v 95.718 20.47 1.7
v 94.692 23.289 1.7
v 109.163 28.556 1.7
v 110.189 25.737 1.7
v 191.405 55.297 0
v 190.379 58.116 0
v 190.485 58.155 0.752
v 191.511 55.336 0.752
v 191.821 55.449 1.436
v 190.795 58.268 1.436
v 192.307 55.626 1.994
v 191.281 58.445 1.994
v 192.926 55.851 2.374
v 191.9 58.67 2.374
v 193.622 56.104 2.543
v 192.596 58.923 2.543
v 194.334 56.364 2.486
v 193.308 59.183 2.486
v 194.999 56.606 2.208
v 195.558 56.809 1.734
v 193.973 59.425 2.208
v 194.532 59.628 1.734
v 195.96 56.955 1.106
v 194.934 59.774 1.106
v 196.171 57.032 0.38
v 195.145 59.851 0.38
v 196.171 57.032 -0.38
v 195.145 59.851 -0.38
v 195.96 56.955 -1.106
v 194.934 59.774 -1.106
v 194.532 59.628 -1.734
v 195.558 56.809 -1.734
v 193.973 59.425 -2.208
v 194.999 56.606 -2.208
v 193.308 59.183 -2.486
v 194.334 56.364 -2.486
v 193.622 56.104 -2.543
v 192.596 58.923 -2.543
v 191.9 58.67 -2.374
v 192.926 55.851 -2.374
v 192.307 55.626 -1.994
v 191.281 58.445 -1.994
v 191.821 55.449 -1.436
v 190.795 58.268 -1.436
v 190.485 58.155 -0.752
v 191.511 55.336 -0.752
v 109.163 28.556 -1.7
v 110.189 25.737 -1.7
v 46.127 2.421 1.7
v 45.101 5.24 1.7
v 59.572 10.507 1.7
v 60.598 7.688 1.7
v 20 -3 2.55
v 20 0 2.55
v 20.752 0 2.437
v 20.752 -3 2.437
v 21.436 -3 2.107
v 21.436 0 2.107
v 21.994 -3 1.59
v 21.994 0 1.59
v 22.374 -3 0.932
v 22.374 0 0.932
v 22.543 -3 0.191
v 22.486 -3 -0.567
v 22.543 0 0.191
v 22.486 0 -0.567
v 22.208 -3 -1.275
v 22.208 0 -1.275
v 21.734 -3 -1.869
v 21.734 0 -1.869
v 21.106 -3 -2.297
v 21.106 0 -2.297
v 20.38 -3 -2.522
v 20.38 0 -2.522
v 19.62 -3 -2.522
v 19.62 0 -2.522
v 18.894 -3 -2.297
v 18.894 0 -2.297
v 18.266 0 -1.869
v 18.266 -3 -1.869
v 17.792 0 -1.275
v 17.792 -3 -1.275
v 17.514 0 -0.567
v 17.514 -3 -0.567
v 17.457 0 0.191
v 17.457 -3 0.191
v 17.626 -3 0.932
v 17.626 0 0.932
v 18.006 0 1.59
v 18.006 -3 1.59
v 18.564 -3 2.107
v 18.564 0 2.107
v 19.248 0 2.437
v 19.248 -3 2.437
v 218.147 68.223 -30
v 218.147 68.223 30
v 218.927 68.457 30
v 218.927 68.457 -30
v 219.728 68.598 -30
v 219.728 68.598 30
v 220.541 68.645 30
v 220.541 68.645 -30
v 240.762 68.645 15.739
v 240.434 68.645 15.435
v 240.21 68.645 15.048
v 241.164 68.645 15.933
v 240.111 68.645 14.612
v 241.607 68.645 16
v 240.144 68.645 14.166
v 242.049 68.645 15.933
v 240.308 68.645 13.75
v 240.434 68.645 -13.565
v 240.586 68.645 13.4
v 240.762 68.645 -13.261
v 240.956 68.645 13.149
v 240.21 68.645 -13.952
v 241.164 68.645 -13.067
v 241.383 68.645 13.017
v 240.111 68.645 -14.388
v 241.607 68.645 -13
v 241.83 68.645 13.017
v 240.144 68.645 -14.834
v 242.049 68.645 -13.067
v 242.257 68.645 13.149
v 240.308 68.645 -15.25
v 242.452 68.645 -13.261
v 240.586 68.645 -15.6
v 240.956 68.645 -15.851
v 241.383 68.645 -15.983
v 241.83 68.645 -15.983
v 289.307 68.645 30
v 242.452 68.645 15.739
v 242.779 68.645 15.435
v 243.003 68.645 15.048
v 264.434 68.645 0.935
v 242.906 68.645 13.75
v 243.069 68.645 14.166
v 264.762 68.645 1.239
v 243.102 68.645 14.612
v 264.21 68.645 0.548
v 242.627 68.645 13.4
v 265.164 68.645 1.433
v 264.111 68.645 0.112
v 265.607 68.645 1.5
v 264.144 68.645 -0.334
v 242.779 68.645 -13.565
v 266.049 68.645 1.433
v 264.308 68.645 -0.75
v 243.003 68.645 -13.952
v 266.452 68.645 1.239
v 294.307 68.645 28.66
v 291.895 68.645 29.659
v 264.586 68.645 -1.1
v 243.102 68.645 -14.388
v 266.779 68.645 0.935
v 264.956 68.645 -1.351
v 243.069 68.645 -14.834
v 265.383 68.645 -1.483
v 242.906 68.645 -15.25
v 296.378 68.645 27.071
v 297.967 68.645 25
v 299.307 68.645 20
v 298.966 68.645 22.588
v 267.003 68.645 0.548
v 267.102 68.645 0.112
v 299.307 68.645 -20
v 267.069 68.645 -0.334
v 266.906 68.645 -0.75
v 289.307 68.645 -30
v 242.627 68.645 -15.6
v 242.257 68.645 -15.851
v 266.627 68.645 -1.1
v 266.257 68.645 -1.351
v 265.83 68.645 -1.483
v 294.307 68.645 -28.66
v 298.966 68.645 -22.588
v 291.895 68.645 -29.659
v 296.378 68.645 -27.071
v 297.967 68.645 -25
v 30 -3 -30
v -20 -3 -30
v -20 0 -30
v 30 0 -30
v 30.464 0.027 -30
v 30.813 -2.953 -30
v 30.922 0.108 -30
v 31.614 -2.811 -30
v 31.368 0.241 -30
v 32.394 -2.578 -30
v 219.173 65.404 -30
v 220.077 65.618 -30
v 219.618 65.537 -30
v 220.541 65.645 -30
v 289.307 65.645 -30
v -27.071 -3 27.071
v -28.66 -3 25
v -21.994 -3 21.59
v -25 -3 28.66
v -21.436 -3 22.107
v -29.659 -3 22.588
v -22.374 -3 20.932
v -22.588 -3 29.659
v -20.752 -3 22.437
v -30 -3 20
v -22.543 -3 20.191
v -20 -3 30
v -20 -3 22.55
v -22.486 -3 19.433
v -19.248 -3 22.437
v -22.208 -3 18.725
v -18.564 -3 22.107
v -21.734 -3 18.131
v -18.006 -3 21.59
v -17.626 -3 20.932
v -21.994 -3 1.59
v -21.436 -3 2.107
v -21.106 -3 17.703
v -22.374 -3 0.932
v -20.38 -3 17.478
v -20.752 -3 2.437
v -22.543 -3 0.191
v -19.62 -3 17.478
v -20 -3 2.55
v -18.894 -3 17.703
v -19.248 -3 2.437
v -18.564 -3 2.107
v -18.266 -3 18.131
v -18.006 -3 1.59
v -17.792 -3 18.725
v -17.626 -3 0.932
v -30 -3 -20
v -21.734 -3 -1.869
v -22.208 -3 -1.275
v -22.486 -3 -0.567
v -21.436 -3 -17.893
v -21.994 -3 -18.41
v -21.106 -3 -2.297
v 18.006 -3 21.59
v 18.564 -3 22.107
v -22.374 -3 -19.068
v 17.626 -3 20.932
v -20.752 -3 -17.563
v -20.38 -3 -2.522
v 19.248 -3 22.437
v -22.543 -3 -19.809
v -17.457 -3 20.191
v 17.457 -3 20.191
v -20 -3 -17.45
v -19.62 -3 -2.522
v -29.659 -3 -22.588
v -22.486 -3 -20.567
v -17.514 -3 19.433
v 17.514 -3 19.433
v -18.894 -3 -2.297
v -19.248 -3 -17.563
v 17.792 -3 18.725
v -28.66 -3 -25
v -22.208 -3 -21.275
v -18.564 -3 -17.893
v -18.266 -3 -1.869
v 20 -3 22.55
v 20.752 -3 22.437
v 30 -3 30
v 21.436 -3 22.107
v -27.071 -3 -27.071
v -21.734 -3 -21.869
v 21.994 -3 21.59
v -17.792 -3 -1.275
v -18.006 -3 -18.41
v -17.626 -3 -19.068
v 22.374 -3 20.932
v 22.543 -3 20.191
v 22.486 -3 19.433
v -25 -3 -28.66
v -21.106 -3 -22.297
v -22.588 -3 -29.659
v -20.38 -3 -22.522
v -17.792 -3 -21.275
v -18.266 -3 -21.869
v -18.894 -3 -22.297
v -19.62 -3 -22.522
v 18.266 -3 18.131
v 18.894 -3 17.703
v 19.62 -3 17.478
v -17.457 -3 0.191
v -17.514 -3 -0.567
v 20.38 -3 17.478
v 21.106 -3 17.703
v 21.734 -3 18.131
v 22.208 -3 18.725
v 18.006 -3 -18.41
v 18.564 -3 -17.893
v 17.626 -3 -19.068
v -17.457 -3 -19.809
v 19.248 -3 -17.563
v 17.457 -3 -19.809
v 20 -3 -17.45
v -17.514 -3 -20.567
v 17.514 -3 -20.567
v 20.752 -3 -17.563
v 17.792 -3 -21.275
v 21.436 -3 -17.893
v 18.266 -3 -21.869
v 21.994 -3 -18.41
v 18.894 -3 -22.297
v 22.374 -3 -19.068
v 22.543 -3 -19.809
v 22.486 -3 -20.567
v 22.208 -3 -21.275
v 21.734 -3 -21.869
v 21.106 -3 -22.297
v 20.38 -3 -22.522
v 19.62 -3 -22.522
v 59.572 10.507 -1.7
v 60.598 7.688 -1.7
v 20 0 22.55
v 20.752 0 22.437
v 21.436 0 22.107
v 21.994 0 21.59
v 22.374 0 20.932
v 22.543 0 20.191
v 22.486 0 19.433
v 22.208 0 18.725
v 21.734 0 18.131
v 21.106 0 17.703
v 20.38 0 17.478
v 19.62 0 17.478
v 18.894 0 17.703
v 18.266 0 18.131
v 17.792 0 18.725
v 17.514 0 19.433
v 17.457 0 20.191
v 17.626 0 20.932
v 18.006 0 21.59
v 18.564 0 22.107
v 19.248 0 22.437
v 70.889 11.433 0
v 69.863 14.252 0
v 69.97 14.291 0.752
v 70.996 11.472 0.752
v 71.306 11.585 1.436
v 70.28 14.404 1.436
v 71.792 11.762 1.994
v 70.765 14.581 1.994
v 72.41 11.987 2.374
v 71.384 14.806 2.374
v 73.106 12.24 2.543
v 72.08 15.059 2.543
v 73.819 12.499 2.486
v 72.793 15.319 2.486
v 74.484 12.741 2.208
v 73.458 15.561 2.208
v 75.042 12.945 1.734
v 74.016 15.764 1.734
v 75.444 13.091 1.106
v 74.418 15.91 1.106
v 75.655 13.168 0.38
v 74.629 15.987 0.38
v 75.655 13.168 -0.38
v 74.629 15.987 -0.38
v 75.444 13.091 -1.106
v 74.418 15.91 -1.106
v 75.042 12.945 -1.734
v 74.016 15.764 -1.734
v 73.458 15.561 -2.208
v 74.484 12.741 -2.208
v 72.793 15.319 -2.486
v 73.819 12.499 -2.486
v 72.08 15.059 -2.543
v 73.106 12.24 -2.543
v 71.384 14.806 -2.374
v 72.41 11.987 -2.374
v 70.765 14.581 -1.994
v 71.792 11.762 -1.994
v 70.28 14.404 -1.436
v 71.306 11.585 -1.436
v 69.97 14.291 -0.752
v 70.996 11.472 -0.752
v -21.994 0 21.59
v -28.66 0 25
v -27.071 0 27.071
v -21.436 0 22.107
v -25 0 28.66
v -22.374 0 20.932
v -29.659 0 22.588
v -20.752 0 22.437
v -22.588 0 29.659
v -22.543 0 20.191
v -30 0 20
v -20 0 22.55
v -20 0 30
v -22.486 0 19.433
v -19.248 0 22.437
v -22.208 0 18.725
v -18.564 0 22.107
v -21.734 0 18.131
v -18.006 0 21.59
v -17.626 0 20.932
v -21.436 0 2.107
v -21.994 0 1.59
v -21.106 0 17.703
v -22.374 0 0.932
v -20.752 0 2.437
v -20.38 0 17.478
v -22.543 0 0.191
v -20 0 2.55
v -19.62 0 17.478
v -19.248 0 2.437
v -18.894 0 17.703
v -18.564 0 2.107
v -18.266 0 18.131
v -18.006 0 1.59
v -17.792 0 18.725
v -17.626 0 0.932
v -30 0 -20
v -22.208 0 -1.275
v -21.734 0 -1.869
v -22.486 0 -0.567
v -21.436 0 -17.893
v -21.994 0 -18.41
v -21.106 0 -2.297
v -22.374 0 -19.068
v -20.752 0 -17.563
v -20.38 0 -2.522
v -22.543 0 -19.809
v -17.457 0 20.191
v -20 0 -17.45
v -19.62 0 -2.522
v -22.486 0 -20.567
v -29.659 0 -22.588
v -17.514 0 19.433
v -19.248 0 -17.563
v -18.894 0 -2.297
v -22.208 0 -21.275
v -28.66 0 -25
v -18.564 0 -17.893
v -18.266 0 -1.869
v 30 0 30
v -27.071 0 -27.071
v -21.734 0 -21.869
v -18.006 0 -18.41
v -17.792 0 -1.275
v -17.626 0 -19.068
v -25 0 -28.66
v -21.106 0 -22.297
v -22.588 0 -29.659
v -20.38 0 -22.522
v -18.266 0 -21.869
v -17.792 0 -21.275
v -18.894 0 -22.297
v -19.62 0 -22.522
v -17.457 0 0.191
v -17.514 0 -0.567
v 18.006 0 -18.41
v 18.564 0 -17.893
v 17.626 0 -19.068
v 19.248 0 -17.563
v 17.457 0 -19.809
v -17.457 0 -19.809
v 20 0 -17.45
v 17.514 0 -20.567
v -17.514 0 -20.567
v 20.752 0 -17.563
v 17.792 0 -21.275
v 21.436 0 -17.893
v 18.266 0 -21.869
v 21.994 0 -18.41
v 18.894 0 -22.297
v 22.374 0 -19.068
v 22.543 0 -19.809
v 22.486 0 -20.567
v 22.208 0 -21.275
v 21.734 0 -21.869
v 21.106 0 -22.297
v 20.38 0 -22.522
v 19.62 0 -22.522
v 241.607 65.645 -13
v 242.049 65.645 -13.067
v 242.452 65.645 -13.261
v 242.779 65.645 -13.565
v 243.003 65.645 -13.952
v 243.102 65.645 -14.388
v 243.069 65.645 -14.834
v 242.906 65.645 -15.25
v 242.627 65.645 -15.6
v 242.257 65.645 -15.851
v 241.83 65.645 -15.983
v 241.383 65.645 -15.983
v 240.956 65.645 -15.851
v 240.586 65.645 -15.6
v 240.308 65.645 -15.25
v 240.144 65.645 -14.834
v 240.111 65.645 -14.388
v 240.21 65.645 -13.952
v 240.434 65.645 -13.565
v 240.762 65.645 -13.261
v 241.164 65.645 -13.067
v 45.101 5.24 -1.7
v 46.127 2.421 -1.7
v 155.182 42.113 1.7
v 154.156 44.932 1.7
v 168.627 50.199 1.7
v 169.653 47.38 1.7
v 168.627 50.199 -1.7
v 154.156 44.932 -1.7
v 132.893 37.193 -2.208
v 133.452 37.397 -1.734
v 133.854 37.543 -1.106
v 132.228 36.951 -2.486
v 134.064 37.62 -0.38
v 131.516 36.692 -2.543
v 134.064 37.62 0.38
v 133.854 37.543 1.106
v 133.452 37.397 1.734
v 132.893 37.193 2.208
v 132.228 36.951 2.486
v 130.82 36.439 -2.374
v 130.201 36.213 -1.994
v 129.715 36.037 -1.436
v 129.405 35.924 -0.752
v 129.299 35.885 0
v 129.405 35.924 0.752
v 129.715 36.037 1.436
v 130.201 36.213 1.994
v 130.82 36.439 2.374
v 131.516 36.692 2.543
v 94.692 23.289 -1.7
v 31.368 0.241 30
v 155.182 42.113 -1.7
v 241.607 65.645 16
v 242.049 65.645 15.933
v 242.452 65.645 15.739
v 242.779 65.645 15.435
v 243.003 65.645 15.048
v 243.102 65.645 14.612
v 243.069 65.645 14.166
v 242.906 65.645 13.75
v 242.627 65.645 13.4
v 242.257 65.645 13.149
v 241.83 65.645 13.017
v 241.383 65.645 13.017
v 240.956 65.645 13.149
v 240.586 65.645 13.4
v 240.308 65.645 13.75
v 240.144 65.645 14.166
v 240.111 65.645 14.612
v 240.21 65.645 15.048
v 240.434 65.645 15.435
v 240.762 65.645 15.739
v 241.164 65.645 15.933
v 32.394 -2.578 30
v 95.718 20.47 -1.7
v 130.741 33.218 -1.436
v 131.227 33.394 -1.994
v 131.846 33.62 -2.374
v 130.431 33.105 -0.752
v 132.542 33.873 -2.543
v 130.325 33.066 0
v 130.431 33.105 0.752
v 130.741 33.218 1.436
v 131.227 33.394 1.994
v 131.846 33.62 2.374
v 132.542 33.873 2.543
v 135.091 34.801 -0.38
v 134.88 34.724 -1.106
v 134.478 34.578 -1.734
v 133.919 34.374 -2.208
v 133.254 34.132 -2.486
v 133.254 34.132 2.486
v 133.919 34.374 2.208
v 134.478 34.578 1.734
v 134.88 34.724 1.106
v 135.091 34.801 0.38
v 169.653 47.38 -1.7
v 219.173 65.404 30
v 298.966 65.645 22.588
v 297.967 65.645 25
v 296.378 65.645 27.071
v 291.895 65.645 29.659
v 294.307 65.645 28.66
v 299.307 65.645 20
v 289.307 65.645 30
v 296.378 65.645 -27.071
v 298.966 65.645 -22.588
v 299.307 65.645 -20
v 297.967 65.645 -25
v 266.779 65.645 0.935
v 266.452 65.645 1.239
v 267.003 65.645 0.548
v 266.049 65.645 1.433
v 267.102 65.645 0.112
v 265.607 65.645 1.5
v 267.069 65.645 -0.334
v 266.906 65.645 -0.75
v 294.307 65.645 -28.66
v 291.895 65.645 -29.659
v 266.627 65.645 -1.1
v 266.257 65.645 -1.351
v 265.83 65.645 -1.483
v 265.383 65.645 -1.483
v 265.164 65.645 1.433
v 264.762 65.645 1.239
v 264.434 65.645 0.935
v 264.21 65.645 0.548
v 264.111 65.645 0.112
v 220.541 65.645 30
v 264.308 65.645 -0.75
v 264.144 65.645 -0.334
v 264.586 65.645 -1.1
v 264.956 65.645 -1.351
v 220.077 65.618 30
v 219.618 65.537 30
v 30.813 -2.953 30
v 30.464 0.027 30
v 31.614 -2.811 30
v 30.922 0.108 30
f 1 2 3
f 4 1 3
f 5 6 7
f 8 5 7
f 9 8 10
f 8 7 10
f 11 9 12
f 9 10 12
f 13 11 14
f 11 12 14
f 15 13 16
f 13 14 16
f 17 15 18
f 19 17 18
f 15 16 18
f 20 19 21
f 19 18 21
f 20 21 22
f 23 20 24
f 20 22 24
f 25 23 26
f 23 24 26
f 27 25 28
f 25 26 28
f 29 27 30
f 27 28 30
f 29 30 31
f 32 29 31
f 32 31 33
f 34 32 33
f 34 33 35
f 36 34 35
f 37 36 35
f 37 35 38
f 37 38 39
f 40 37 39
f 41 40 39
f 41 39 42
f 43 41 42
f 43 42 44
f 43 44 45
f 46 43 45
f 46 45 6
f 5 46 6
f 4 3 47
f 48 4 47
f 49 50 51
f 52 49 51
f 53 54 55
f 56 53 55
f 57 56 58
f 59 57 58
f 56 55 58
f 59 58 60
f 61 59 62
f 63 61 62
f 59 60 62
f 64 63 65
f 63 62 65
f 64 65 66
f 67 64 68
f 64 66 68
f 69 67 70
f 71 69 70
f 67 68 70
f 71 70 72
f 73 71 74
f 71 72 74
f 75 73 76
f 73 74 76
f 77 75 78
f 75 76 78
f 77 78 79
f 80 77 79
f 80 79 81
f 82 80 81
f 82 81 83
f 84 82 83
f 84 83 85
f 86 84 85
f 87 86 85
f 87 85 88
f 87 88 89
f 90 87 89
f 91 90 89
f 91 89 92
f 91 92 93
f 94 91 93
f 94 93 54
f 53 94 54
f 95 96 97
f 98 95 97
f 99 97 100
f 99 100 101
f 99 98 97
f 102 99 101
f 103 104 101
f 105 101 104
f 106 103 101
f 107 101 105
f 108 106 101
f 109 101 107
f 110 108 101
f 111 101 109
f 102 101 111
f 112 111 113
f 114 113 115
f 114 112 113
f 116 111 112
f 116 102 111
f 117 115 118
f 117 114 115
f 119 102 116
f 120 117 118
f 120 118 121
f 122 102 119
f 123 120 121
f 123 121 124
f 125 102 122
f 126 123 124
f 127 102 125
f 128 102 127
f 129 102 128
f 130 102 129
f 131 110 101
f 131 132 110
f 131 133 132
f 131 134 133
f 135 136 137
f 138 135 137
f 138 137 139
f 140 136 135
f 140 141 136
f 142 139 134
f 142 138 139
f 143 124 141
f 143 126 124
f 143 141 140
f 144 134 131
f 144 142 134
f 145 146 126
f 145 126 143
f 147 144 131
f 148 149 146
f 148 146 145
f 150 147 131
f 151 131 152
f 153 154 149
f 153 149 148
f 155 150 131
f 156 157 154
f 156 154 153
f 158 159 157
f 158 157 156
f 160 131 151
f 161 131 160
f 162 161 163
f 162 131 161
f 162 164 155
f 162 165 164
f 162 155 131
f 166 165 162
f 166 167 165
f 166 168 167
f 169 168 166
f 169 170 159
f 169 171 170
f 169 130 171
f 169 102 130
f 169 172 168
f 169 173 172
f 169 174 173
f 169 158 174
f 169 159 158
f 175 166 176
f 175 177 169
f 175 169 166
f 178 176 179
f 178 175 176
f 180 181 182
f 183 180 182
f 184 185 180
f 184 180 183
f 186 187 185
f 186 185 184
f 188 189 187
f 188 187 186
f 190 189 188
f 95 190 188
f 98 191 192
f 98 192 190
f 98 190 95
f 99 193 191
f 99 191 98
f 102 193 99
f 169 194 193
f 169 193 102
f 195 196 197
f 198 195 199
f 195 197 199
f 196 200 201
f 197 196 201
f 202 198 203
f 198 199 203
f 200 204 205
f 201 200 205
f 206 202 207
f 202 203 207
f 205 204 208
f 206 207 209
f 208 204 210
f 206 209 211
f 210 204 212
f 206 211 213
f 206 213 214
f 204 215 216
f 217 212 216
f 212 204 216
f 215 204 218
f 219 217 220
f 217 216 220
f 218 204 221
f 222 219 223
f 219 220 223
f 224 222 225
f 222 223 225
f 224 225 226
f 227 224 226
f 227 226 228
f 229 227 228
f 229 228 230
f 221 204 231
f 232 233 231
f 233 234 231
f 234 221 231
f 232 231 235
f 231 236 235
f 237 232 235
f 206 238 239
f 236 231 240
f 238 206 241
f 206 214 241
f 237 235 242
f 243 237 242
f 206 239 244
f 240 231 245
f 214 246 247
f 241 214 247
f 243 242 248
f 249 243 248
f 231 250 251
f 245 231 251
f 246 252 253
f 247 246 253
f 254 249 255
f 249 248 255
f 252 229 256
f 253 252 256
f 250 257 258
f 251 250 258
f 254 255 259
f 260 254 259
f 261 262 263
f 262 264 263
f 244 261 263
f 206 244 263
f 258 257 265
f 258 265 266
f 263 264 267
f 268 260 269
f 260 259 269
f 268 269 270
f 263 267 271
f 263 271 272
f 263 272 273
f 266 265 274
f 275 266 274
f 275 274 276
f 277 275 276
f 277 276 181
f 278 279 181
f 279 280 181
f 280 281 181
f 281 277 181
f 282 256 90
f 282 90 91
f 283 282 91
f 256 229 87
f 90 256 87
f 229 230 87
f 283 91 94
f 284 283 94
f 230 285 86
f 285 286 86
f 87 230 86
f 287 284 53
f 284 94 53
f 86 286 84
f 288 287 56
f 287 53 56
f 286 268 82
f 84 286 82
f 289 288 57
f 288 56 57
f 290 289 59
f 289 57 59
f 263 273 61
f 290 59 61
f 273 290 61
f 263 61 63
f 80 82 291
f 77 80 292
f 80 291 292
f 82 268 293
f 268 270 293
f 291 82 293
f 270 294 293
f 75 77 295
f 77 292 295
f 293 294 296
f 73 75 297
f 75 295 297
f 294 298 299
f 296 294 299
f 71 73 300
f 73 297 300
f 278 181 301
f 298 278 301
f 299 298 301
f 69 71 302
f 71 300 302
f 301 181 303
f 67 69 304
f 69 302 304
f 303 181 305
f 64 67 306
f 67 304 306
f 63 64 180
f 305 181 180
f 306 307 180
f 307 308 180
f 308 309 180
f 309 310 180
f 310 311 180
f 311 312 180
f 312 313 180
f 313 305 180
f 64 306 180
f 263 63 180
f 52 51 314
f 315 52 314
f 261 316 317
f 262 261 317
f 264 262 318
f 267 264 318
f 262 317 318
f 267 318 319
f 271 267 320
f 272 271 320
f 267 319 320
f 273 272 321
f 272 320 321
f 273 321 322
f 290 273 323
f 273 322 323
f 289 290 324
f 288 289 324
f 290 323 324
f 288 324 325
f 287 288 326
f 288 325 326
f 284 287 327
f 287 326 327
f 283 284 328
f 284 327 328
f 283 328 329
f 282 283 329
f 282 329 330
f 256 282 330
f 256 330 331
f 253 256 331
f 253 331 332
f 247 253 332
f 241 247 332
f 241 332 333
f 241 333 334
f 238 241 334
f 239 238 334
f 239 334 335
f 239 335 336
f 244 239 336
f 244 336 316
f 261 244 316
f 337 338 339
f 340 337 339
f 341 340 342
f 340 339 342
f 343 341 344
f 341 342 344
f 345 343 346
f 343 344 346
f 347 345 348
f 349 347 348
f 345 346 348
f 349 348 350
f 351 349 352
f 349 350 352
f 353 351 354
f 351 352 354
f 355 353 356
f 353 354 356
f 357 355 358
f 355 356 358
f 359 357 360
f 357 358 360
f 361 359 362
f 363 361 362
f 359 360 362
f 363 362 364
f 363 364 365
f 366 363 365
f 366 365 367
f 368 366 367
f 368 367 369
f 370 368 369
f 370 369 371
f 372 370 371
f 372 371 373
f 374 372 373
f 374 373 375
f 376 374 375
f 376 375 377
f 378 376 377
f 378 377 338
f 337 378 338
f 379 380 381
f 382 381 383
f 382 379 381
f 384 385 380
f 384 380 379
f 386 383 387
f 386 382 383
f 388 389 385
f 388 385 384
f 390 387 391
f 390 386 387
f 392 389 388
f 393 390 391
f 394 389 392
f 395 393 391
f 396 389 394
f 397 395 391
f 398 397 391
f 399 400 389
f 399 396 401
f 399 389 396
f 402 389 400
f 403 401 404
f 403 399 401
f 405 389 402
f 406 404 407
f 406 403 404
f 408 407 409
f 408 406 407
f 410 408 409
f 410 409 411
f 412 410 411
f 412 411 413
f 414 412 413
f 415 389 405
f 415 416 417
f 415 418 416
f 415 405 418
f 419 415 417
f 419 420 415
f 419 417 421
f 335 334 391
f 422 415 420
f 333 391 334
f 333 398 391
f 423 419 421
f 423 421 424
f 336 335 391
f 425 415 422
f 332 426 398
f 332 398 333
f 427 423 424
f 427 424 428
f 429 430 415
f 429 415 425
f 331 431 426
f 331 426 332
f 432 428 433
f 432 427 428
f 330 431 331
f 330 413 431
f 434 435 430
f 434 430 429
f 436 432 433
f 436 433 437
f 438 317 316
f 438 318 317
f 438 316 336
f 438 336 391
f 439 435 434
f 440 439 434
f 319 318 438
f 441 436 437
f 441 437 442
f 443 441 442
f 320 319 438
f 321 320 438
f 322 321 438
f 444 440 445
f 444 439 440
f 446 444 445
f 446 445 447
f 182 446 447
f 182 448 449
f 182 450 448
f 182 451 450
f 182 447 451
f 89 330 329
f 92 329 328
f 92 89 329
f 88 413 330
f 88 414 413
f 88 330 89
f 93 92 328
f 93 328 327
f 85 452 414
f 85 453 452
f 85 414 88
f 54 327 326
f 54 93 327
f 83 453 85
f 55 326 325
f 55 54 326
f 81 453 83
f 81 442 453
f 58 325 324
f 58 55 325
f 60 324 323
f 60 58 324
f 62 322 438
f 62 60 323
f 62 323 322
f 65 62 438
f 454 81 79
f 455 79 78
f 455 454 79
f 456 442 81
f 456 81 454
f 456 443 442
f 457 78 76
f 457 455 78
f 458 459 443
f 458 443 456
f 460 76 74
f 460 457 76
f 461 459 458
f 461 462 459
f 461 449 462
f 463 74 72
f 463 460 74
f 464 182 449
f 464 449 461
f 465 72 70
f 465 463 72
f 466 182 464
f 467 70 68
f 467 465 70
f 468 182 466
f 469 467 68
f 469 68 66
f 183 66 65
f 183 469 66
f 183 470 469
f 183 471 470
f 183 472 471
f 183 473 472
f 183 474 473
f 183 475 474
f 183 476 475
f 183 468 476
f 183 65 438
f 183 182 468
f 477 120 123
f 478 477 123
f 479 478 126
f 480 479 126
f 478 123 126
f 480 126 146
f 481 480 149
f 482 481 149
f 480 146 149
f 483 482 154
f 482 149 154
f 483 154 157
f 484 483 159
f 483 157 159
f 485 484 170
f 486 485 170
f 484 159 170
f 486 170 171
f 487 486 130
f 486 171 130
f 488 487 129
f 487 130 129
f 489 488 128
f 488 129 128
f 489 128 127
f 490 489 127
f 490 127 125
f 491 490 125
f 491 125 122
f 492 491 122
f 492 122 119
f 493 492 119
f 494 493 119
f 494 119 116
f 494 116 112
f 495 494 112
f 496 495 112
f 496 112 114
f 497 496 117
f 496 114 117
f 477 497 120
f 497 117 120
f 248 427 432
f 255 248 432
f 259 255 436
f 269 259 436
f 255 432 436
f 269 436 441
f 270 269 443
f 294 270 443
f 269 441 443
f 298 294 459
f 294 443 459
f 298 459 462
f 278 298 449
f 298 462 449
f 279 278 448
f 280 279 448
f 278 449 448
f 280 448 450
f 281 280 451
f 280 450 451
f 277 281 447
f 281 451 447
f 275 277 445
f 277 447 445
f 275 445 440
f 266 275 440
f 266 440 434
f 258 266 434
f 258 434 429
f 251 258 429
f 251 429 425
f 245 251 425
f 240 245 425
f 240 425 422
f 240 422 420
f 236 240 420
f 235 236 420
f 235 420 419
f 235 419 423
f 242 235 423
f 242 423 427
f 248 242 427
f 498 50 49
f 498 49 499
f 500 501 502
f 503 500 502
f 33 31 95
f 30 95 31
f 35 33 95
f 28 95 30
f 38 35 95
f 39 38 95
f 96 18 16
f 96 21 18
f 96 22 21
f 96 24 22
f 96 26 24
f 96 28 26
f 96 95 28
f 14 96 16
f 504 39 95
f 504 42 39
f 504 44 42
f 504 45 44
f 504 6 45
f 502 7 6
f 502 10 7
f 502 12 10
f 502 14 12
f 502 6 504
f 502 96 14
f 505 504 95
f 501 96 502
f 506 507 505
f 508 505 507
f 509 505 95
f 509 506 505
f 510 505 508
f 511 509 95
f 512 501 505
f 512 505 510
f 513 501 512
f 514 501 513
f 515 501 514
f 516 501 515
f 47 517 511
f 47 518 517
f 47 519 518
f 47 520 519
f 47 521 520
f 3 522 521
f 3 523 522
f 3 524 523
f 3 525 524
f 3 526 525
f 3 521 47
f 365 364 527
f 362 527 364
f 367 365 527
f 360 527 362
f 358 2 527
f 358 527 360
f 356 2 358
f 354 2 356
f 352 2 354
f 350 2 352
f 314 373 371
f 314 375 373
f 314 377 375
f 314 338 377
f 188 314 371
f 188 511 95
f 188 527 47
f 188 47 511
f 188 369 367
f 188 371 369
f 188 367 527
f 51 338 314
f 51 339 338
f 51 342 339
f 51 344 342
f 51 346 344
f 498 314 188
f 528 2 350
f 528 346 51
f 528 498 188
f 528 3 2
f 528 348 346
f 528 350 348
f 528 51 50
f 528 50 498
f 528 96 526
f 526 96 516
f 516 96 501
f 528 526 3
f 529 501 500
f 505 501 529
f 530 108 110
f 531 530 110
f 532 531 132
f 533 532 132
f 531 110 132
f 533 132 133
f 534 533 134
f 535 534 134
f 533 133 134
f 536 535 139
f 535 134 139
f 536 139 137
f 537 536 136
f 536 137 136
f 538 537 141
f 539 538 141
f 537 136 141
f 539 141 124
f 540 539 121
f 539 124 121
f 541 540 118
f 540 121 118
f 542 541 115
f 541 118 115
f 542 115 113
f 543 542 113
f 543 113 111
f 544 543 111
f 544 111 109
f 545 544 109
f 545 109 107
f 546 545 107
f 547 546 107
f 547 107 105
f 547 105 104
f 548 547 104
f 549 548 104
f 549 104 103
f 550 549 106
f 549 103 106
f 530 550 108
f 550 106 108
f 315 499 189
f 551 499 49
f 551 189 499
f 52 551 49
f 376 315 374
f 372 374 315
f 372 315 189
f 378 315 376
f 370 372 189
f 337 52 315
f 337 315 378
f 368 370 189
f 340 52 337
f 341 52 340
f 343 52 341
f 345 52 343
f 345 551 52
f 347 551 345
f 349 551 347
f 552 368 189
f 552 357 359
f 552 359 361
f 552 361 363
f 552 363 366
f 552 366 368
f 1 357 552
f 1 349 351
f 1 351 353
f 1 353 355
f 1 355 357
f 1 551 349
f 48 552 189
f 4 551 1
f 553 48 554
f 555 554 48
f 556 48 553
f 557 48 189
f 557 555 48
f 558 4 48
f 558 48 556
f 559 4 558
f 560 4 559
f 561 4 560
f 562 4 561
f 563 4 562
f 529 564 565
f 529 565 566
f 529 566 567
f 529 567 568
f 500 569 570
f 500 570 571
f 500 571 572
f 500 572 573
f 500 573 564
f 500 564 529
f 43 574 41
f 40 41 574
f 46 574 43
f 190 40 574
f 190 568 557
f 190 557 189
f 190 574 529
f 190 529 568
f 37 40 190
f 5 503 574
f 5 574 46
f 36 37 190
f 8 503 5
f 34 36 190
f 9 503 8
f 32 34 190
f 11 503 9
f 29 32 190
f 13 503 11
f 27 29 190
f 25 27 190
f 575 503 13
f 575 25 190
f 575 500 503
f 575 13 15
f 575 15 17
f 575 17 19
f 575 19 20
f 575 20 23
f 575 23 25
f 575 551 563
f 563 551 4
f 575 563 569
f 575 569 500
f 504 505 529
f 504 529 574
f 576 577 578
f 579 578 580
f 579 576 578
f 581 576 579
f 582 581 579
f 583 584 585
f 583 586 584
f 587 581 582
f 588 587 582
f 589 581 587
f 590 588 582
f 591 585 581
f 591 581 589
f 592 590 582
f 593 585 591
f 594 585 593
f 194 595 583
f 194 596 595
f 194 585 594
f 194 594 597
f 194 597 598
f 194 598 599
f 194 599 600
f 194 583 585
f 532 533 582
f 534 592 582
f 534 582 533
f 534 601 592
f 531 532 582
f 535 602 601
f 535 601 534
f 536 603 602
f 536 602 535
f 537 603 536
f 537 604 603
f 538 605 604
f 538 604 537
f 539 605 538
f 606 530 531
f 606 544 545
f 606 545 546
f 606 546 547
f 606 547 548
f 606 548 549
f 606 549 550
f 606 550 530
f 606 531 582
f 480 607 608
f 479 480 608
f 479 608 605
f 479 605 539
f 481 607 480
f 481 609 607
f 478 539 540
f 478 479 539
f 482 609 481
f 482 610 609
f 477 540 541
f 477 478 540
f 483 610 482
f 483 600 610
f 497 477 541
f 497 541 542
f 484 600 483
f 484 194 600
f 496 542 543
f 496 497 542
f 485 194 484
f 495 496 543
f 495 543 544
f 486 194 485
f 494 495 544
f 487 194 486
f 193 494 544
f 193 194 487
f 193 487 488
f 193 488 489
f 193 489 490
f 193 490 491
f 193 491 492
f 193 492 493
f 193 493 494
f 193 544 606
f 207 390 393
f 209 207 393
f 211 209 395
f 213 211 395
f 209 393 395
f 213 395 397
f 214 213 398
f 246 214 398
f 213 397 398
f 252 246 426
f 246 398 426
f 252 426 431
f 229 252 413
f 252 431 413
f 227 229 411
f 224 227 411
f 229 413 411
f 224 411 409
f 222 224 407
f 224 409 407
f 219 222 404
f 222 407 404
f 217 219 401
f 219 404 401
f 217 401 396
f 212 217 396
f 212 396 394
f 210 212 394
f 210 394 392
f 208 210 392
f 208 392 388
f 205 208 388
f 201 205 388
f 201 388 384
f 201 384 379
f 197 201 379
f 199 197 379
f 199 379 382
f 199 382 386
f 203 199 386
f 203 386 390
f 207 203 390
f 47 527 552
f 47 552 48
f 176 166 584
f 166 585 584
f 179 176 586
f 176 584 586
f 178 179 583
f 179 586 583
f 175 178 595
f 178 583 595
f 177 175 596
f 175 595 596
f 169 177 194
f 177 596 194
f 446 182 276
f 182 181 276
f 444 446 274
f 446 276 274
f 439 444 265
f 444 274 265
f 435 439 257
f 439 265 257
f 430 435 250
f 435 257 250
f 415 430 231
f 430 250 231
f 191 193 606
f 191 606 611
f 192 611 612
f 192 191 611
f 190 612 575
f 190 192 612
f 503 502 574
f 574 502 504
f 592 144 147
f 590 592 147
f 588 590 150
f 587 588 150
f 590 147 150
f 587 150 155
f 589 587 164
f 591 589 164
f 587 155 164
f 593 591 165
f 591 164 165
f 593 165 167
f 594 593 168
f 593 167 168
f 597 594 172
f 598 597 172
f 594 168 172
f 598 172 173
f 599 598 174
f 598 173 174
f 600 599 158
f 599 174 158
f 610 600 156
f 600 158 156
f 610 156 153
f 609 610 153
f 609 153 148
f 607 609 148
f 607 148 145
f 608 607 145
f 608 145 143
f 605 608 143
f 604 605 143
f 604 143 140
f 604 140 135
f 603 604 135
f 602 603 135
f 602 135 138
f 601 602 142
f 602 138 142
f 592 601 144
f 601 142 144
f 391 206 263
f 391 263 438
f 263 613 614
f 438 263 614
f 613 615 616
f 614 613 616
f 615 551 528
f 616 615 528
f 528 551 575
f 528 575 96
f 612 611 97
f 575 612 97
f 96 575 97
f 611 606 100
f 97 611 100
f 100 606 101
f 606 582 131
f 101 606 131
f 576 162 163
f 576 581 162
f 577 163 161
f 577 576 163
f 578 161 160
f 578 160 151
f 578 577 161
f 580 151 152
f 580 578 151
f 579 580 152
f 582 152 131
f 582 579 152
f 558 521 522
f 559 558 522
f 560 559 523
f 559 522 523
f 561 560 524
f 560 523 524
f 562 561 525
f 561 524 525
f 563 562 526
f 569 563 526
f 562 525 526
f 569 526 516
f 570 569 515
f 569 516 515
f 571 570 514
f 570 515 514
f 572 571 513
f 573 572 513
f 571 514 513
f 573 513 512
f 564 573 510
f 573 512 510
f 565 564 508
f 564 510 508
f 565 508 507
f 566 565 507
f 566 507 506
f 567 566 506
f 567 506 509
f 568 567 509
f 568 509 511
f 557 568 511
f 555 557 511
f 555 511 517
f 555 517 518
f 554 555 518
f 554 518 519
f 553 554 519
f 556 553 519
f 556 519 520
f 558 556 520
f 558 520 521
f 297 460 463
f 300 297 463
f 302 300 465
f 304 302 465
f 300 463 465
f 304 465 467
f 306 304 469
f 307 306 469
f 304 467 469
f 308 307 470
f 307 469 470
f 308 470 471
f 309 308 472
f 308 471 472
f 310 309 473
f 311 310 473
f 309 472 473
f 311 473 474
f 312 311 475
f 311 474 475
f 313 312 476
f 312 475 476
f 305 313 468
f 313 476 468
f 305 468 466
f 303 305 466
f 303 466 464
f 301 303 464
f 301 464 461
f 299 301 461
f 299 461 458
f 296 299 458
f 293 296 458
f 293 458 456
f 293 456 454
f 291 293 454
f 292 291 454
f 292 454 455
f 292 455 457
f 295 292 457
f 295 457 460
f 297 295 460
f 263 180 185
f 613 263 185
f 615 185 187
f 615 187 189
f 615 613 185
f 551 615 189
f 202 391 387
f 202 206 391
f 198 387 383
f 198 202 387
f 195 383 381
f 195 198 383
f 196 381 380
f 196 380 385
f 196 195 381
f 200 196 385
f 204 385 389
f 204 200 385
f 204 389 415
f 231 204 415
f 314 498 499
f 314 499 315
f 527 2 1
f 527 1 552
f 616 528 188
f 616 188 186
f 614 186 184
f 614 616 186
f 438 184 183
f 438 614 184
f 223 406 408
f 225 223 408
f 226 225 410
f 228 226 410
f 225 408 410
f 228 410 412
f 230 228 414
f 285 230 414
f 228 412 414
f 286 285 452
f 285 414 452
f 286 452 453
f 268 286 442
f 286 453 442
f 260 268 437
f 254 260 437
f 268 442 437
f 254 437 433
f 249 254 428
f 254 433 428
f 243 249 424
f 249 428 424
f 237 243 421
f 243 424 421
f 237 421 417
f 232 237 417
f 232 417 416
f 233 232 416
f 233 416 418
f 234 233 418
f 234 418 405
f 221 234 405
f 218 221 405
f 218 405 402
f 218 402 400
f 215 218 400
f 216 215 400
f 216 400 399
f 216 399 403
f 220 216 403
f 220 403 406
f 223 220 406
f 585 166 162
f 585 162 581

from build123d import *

# Parameters (mm, degrees)
SKETCH1_W          = 60
SKETCH1_H          = 60
BASE_FLANGE1_DEPTH = 3
EDGE_FLANGE1_DEPTH = 60
EDGE_FLANGE2_DEPTH = 60
FILLET1_R          = 10
SKETCH12_R         = 2.55
CUT_EXTRUDE1_DEPTH = 10
CAVITY1_START      = -1.5
CAVITY1_DEPTH      = 3
SKETCH15_W         = 15.4
SKETCH15_H         = 3.400000894
SKETCH15_H_2       = 3.4
CUT_EXTRUDE3_DEPTH = 3
SKETCH16_R         = 1.5
CUT_EXTRUDE4_DEPTH = 3
SKETCH17_R         = 2.55
CUT_EXTRUDE5_DEPTH = 10


# Read off the part's stored shape, not the designer's step: Cavity1
# Sheet-metal steps are written as plain solids
with BuildPart() as part:
    # Sketch1 → Base-Flange1 (new body)
    with BuildSketch(Plane(origin=(0, 0, 0), x_dir=(1, 0, 0), z_dir=(0, 1, 0))):
        Rectangle(SKETCH1_W, SKETCH1_H)
    extrude(amount=-BASE_FLANGE1_DEPTH)

    # Edge-Flange1 section (across the edge) → Edge-Flange1 (add)
    with BuildSketch(Plane(origin=(30.705307923, 0, 30), x_dir=(-0.3420201433256631, 0.9396926207859105, 0), z_dir=(0, 0, -1))):
        with BuildLine():
            Line((-3, 0.705307923), (-3, 199.471019058))
            Line((-3, 199.471019058), (0, 199.471019058))
            Line((0, 199.471019058), (0, 0.705307923))
            ThreePointArc((0, 0.705307923), (0.060768988, 0.010715212), (0.241229517, -0.66277265))
            Line((0.241229517, -0.66277265), (-2.577848346, -1.68883308))
            ThreePointArc((-2.577848346, -1.68883308), (-2.893654271, -0.510229321), (-3, 0.705307923))
        make_face()
    extrude(amount=EDGE_FLANGE1_DEPTH)

    # Edge-Flange2 section (across the edge) → Edge-Flange2 (add)
    with BuildSketch(Plane(origin=(219.835585673, 65.645258182, -30), x_dir=(0, -1, 0), z_dir=(0, 0, 1))):
        with BuildLine():
            Line((-3, 0.705307923), (-3, 79.471019058))
            Line((-3, 79.471019058), (0, 79.471019058))
            Line((0, 79.471019058), (0, 0.705307923))
            ThreePointArc((0, 0.705307923), (0.060768988, 0.010715212), (0.241229517, -0.66277265))
            Line((0.241229517, -0.66277265), (-2.577848346, -1.68883308))
            ThreePointArc((-2.577848346, -1.68883308), (-2.893654271, -0.510229321), (-3, 0.705307923))
        make_face()
    extrude(amount=EDGE_FLANGE2_DEPTH)

    # Fillet1
    fillet1_edges = [part.edges().sort_by_distance(p)[0] for p in [
        (299.30660473, 67.145258182, -30),
        (299.30660473, 67.145258182, 30),
        (-30, -1.5, 30),
        (-30, -1.5, -30),
    ]]
    fillet(fillet1_edges, radius=FILLET1_R)

    # Sketch12 → Cut-Extrude1 (cut)
    with BuildSketch(Plane(origin=(0, 0, 0), x_dir=(1, 0, 0), z_dir=(0, 1, 0))):
        with Locations(Location((20, 20, 0), (0, 0, 270))):
            Circle(SKETCH12_R)
        with Locations(Location((20, -20, 0), (0, 0, 270))):
            Circle(SKETCH12_R)
        with Locations(Location((-20, -20, 0), (0, 0, 270))):
            Circle(SKETCH12_R)
        with Locations(Location((-20, 20, 0), (0, 0, 270))):
            Circle(SKETCH12_R)
        with Locations(Location((-20, 0, 0), (0, 0, 270))):
            Circle(SKETCH12_R)
        with Locations(Location((20, 0, 0), (0, 0, 270))):
            Circle(SKETCH12_R)
    extrude(amount=-CUT_EXTRUDE1_DEPTH, mode=Mode.SUBTRACT)

    # Cavity1 outline → Cavity1 (cut)
    with BuildSketch(Plane.XY.offset(CAVITY1_START)):
        with BuildLine():
            ThreePointArc((167.585662257, 46.627841316), (168.714237544, 47.661990034), (168.781007212, 49.191266844))
            Line((168.781007212, 49.191266844), (168.438987069, 50.130959465))
            Line((168.438987069, 50.130959465), (154.343597757, 45.000657315))
            Line((154.343597757, 45.000657315), (154.6856179, 44.060964694))
            ThreePointArc((154.6856179, 44.060964694), (155.719766618, 42.932389407), (157.249043428, 42.865619739))
            Line((157.249043428, 42.865619739), (167.585662257, 46.627841316))
        make_face()
        with BuildLine():
            Line((109.317258169, 27.548232175), (108.975238025, 28.487924795))
            Line((108.975238025, 28.487924795), (94.879848713, 23.357622645))
            Line((94.879848713, 23.357622645), (95.221868857, 22.417930025))
            ThreePointArc((95.221868857, 22.417930025), (96.256017575, 21.289354737), (97.785294385, 21.22258507))
            Line((97.785294385, 21.22258507), (108.121913214, 24.984806646))
            ThreePointArc((108.121913214, 24.984806646), (109.250488501, 26.018955365), (109.317258169, 27.548232175))
        make_face()
        with BuildLine():
            Line((59.726286316, 9.498594532), (59.384266173, 10.438287153))
            Line((59.384266173, 10.438287153), (45.288876861, 5.307985003))
            Line((45.288876861, 5.307985003), (45.630897004, 4.368292382))
            ThreePointArc((45.630897004, 4.368292382), (46.665045723, 3.239717095), (48.194322533, 3.172947427))
            Line((48.194322533, 3.172947427), (58.530941361, 6.935169004))
            ThreePointArc((58.530941361, 6.935169004), (59.659516649, 7.969317722), (59.726286316, 9.498594532))
        make_face()
    extrude(amount=CAVITY1_DEPTH, mode=Mode.SUBTRACT)

    # Sketch15 → Cut-Extrude3 (cut)
    with BuildSketch(Plane(origin=(3.591838707, -9.868495742, 0), x_dir=(0.9396926207859104, 0.34202014332566316, 0), z_dir=(-0.34202014332566316, 0.9396926207859104, 0))):
        with Locations((104.646671142, 0)):
            Rectangle(SKETCH15_W, SKETCH15_H)
        with Locations((51.873061181, 0)):
            Rectangle(SKETCH15_W, SKETCH15_H)
        with Locations((167.926671142, 0)):
            Rectangle(SKETCH15_W, SKETCH15_H_2)
    extrude(amount=-CUT_EXTRUDE3_DEPTH, mode=Mode.SUBTRACT)

    # Sketch16 → Cut-Extrude4 (cut)
    with BuildSketch(Plane(origin=(0, 68.645258182, 0), x_dir=(1, 0, 0), z_dir=(0, 1, 0))):
        with Locations(Location((265.60660473, 0, 0), (0, 0, 270))):
            Circle(SKETCH16_R)
        with Locations(Location((241.60660473, 14.5, 0), (0, 0, 270))):
            Circle(SKETCH16_R)
        with Locations(Location((241.60660473, -14.5, 0), (0, 0, 270))):
            Circle(SKETCH16_R)
    extrude(amount=-CUT_EXTRUDE4_DEPTH, mode=Mode.SUBTRACT)

    # Sketch17 → Cut-Extrude5 (cut)
    with BuildSketch(Plane(origin=(3.591838707, -9.868495742, 0), x_dir=(0.9396926207859104, 0.34202014332566316, 0), z_dir=(-0.34202014332566316, 0.9396926207859104, 0))):
        with Locations(Location((136.324570332, 0, 0), (0, 0, 180))):
            Circle(SKETCH17_R)
        with Locations(Location((201.324570332, 0, 0), (0, 0, 180))):
            Circle(SKETCH17_R)
        with Locations(Location((73.074570332, 0, 0), (0, 0, 180))):
            Circle(SKETCH17_R)
    extrude(amount=-CUT_EXTRUDE5_DEPTH, mode=Mode.SUBTRACT)


solid = part.part
